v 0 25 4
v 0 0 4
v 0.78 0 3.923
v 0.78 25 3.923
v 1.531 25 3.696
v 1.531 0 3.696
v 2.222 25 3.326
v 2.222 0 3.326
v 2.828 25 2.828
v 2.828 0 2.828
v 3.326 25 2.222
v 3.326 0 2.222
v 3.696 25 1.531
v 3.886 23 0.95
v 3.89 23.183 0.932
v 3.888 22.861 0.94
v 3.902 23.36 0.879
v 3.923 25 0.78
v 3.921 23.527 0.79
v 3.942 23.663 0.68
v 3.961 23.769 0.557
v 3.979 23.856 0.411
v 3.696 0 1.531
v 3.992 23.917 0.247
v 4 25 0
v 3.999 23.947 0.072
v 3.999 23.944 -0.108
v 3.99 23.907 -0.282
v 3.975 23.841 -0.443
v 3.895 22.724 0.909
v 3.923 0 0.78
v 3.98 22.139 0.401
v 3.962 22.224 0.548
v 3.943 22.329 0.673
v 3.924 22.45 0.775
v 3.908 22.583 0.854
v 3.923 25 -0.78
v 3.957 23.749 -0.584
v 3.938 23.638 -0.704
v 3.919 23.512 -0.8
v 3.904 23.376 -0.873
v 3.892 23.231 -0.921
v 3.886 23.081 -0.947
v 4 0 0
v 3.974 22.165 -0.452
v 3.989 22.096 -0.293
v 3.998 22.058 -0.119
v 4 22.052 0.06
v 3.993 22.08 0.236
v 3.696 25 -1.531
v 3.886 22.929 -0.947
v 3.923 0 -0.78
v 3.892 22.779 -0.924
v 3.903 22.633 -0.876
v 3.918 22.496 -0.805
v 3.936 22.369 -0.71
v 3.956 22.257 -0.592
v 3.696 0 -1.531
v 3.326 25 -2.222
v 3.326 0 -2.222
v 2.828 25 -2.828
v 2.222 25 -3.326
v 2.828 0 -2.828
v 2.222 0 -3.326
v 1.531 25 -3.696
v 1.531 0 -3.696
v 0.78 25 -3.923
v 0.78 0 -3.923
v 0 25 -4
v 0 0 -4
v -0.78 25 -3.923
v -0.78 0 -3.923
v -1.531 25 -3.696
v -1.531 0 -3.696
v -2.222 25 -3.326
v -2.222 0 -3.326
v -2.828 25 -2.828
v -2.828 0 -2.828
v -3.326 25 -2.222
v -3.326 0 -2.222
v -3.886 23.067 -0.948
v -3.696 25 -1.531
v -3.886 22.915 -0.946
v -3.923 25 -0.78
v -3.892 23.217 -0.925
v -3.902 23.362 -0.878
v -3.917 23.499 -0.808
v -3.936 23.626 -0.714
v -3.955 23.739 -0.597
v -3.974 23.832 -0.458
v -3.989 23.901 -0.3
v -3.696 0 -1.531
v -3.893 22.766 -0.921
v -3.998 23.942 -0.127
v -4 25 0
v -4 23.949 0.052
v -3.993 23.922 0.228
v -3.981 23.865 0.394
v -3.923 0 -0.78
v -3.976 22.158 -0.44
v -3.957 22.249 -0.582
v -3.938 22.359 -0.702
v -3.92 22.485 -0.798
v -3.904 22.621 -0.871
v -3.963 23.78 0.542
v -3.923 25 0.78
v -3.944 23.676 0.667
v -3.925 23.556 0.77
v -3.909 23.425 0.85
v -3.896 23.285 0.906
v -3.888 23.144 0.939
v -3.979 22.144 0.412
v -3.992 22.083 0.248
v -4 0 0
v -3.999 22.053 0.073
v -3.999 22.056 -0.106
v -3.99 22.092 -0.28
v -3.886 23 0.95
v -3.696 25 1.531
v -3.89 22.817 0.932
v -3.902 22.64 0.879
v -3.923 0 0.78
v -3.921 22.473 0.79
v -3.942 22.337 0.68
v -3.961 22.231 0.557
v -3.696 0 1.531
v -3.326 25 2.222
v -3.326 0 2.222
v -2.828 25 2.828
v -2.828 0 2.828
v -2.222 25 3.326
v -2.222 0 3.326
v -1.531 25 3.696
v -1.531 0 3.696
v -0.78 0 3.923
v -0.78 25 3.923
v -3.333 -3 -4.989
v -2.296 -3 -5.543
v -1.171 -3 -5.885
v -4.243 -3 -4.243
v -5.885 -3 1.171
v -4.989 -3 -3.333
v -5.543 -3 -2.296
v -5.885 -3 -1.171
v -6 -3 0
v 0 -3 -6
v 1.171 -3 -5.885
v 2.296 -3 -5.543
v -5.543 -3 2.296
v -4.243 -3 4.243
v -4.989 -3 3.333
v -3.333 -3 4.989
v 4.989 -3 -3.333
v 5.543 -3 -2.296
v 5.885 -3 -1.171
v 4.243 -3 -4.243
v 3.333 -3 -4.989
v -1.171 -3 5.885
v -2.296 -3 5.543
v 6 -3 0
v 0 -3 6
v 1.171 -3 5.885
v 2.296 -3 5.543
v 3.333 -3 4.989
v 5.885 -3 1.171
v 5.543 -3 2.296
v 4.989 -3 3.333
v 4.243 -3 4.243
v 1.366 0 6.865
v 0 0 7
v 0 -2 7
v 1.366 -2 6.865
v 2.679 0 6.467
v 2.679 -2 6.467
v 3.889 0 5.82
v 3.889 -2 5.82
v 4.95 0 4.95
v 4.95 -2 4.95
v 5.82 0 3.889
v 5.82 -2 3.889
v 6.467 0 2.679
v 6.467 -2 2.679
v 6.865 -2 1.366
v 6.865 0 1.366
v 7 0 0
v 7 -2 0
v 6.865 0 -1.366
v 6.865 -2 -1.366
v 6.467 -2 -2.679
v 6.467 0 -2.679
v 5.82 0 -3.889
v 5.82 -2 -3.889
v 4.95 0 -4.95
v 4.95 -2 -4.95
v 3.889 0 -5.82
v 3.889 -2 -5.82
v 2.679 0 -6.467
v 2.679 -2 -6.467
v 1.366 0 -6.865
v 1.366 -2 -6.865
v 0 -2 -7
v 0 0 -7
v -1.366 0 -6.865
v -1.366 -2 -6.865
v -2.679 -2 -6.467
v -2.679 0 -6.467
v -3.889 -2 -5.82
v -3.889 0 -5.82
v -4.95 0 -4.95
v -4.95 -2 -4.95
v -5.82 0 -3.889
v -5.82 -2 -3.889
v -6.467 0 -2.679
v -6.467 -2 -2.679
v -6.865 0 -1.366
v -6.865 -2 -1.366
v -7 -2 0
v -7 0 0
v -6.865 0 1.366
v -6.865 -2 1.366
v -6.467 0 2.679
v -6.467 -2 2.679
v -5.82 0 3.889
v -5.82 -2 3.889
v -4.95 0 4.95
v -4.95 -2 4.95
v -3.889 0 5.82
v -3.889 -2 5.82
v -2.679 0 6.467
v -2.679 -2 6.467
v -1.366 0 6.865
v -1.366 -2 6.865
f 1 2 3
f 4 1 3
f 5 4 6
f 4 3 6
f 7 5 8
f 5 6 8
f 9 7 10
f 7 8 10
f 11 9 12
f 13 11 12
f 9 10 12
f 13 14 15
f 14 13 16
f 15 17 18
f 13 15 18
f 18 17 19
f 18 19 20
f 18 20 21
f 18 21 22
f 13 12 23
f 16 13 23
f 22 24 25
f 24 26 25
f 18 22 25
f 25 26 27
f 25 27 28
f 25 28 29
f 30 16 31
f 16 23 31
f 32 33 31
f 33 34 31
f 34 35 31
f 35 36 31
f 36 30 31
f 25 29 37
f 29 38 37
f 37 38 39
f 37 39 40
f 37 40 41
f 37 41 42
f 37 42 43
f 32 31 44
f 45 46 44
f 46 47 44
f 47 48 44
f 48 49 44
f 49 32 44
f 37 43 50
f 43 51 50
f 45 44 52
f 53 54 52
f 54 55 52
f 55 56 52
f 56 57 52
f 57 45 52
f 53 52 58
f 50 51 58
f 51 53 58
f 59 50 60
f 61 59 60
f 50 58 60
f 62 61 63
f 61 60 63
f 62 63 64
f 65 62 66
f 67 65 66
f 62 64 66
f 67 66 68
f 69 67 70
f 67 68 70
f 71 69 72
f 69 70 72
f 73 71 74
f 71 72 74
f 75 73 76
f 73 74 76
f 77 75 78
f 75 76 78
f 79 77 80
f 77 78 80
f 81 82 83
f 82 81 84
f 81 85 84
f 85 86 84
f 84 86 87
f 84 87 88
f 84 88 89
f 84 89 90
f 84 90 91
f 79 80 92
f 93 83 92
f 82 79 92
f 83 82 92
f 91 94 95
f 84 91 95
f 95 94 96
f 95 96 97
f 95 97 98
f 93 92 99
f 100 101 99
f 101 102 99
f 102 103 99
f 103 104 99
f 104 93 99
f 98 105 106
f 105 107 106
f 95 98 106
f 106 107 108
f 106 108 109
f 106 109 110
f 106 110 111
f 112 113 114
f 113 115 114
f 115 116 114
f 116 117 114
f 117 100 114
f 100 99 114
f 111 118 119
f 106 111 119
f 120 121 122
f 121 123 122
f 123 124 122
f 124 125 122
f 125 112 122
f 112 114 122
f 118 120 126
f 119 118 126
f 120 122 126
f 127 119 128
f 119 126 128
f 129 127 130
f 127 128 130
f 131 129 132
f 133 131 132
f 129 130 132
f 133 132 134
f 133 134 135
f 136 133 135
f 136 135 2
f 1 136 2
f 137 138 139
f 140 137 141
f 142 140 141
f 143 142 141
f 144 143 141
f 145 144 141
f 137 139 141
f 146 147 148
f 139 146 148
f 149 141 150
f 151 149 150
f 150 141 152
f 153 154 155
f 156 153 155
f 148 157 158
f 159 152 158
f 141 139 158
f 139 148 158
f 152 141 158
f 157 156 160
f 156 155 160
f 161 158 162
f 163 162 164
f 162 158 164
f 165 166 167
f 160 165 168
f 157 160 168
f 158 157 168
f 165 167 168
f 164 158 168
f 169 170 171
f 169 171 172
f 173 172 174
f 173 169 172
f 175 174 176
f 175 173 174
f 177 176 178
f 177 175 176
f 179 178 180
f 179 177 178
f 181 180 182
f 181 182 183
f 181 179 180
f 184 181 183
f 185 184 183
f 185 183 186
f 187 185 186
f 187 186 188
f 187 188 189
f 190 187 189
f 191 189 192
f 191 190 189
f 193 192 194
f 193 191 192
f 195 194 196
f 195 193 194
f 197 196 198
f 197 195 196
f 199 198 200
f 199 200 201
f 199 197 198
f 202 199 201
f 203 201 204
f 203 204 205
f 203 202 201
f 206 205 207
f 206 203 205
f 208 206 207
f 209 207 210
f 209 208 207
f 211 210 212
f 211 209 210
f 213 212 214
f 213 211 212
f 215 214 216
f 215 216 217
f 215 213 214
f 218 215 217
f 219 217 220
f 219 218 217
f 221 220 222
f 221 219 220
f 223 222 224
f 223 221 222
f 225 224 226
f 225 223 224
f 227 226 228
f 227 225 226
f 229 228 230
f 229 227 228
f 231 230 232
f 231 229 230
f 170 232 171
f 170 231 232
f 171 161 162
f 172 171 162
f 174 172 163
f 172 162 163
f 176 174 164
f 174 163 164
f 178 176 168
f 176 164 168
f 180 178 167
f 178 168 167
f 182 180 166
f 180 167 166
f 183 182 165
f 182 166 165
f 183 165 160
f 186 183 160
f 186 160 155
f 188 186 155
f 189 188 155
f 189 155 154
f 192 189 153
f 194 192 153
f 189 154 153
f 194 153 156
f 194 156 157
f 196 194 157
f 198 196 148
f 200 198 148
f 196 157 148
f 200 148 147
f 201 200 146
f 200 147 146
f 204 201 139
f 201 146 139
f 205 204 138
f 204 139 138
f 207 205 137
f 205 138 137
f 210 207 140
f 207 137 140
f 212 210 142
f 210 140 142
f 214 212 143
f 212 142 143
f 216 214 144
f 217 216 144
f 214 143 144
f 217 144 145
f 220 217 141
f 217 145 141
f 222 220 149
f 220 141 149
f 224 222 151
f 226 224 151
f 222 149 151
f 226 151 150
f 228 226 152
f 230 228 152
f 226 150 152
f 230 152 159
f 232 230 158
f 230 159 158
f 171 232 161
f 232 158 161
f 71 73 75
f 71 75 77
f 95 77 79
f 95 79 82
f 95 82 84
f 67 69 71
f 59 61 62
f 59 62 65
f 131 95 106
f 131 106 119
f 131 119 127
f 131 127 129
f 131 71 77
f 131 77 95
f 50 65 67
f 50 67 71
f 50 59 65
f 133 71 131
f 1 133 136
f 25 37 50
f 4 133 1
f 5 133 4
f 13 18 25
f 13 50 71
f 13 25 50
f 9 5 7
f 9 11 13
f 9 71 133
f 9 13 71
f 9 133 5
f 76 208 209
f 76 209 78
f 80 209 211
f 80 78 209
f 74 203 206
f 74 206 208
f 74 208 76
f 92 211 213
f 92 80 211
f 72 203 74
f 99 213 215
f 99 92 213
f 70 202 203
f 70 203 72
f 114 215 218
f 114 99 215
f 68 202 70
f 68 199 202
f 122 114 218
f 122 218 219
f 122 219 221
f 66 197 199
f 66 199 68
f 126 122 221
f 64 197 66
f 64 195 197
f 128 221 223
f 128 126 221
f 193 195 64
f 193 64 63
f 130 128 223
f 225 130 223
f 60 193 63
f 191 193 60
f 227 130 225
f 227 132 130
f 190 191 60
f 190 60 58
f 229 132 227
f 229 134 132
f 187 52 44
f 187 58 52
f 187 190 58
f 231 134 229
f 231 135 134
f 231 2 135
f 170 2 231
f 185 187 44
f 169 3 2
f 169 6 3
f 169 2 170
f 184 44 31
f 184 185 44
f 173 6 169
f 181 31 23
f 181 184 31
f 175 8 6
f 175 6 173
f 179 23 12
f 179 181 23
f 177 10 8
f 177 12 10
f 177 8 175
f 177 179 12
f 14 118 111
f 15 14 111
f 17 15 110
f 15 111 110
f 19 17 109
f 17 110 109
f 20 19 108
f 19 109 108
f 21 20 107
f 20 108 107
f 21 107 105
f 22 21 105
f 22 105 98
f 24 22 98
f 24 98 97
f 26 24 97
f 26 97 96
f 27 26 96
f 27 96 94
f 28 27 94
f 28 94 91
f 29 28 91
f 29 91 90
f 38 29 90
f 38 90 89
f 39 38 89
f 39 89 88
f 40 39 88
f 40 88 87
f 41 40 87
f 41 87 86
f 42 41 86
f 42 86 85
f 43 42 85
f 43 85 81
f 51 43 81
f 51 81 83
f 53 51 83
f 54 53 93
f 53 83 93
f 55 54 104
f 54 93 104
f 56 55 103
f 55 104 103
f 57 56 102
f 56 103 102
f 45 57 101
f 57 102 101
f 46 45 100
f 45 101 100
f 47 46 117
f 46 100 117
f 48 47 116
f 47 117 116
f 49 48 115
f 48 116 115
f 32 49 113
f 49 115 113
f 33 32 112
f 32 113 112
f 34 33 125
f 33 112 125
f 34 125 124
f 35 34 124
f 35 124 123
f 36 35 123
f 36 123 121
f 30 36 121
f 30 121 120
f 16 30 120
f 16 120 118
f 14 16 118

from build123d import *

# Parameters (mm, degrees)
SKETCH1_R           = 7
BOSS_EXTRUDE1_DEPTH = 3
SKETCH1_3_R         = 4
BOSS_EXTRUDE2_DEPTH = 25
SKETCH3_R           = 0.95
CUT_EXTRUDE1_DEPTH  = 29.19574436
CHAMFER1_SIZE       = 1


with BuildPart() as part:
    # Sketch1 → Boss-Extrude1 (new body)
    with BuildSketch(Plane(origin=(0, 0, 0), x_dir=(1, 0, 0), z_dir=(0, 1, 0))):
        Circle(SKETCH1_R)
    extrude(amount=-BOSS_EXTRUDE1_DEPTH)

    # Sketch1<3> → Boss-Extrude2 (add)
    with BuildSketch(Plane(origin=(0, 0, 0), x_dir=(1, 0, 0), z_dir=(0, 1, 0))):
        Circle(SKETCH1_3_R)
    extrude(amount=BOSS_EXTRUDE2_DEPTH)

    # Sketch3 → Cut-Extrude1 (cut, through all)
    with BuildSketch(Plane.ZY.offset(4)):
        with Locations((0, 23)):
            Circle(SKETCH3_R)
    extrude(amount=-CUT_EXTRUDE1_DEPTH, mode=Mode.SUBTRACT)

    # Chamfer1
    chamfer1_edges = [part.edges().sort_by_distance(p)[0] for p in [
        (-7, -3, 0),
    ]]
    chamfer(chamfer1_edges, length=CHAMFER1_SIZE)


solid = part.part
